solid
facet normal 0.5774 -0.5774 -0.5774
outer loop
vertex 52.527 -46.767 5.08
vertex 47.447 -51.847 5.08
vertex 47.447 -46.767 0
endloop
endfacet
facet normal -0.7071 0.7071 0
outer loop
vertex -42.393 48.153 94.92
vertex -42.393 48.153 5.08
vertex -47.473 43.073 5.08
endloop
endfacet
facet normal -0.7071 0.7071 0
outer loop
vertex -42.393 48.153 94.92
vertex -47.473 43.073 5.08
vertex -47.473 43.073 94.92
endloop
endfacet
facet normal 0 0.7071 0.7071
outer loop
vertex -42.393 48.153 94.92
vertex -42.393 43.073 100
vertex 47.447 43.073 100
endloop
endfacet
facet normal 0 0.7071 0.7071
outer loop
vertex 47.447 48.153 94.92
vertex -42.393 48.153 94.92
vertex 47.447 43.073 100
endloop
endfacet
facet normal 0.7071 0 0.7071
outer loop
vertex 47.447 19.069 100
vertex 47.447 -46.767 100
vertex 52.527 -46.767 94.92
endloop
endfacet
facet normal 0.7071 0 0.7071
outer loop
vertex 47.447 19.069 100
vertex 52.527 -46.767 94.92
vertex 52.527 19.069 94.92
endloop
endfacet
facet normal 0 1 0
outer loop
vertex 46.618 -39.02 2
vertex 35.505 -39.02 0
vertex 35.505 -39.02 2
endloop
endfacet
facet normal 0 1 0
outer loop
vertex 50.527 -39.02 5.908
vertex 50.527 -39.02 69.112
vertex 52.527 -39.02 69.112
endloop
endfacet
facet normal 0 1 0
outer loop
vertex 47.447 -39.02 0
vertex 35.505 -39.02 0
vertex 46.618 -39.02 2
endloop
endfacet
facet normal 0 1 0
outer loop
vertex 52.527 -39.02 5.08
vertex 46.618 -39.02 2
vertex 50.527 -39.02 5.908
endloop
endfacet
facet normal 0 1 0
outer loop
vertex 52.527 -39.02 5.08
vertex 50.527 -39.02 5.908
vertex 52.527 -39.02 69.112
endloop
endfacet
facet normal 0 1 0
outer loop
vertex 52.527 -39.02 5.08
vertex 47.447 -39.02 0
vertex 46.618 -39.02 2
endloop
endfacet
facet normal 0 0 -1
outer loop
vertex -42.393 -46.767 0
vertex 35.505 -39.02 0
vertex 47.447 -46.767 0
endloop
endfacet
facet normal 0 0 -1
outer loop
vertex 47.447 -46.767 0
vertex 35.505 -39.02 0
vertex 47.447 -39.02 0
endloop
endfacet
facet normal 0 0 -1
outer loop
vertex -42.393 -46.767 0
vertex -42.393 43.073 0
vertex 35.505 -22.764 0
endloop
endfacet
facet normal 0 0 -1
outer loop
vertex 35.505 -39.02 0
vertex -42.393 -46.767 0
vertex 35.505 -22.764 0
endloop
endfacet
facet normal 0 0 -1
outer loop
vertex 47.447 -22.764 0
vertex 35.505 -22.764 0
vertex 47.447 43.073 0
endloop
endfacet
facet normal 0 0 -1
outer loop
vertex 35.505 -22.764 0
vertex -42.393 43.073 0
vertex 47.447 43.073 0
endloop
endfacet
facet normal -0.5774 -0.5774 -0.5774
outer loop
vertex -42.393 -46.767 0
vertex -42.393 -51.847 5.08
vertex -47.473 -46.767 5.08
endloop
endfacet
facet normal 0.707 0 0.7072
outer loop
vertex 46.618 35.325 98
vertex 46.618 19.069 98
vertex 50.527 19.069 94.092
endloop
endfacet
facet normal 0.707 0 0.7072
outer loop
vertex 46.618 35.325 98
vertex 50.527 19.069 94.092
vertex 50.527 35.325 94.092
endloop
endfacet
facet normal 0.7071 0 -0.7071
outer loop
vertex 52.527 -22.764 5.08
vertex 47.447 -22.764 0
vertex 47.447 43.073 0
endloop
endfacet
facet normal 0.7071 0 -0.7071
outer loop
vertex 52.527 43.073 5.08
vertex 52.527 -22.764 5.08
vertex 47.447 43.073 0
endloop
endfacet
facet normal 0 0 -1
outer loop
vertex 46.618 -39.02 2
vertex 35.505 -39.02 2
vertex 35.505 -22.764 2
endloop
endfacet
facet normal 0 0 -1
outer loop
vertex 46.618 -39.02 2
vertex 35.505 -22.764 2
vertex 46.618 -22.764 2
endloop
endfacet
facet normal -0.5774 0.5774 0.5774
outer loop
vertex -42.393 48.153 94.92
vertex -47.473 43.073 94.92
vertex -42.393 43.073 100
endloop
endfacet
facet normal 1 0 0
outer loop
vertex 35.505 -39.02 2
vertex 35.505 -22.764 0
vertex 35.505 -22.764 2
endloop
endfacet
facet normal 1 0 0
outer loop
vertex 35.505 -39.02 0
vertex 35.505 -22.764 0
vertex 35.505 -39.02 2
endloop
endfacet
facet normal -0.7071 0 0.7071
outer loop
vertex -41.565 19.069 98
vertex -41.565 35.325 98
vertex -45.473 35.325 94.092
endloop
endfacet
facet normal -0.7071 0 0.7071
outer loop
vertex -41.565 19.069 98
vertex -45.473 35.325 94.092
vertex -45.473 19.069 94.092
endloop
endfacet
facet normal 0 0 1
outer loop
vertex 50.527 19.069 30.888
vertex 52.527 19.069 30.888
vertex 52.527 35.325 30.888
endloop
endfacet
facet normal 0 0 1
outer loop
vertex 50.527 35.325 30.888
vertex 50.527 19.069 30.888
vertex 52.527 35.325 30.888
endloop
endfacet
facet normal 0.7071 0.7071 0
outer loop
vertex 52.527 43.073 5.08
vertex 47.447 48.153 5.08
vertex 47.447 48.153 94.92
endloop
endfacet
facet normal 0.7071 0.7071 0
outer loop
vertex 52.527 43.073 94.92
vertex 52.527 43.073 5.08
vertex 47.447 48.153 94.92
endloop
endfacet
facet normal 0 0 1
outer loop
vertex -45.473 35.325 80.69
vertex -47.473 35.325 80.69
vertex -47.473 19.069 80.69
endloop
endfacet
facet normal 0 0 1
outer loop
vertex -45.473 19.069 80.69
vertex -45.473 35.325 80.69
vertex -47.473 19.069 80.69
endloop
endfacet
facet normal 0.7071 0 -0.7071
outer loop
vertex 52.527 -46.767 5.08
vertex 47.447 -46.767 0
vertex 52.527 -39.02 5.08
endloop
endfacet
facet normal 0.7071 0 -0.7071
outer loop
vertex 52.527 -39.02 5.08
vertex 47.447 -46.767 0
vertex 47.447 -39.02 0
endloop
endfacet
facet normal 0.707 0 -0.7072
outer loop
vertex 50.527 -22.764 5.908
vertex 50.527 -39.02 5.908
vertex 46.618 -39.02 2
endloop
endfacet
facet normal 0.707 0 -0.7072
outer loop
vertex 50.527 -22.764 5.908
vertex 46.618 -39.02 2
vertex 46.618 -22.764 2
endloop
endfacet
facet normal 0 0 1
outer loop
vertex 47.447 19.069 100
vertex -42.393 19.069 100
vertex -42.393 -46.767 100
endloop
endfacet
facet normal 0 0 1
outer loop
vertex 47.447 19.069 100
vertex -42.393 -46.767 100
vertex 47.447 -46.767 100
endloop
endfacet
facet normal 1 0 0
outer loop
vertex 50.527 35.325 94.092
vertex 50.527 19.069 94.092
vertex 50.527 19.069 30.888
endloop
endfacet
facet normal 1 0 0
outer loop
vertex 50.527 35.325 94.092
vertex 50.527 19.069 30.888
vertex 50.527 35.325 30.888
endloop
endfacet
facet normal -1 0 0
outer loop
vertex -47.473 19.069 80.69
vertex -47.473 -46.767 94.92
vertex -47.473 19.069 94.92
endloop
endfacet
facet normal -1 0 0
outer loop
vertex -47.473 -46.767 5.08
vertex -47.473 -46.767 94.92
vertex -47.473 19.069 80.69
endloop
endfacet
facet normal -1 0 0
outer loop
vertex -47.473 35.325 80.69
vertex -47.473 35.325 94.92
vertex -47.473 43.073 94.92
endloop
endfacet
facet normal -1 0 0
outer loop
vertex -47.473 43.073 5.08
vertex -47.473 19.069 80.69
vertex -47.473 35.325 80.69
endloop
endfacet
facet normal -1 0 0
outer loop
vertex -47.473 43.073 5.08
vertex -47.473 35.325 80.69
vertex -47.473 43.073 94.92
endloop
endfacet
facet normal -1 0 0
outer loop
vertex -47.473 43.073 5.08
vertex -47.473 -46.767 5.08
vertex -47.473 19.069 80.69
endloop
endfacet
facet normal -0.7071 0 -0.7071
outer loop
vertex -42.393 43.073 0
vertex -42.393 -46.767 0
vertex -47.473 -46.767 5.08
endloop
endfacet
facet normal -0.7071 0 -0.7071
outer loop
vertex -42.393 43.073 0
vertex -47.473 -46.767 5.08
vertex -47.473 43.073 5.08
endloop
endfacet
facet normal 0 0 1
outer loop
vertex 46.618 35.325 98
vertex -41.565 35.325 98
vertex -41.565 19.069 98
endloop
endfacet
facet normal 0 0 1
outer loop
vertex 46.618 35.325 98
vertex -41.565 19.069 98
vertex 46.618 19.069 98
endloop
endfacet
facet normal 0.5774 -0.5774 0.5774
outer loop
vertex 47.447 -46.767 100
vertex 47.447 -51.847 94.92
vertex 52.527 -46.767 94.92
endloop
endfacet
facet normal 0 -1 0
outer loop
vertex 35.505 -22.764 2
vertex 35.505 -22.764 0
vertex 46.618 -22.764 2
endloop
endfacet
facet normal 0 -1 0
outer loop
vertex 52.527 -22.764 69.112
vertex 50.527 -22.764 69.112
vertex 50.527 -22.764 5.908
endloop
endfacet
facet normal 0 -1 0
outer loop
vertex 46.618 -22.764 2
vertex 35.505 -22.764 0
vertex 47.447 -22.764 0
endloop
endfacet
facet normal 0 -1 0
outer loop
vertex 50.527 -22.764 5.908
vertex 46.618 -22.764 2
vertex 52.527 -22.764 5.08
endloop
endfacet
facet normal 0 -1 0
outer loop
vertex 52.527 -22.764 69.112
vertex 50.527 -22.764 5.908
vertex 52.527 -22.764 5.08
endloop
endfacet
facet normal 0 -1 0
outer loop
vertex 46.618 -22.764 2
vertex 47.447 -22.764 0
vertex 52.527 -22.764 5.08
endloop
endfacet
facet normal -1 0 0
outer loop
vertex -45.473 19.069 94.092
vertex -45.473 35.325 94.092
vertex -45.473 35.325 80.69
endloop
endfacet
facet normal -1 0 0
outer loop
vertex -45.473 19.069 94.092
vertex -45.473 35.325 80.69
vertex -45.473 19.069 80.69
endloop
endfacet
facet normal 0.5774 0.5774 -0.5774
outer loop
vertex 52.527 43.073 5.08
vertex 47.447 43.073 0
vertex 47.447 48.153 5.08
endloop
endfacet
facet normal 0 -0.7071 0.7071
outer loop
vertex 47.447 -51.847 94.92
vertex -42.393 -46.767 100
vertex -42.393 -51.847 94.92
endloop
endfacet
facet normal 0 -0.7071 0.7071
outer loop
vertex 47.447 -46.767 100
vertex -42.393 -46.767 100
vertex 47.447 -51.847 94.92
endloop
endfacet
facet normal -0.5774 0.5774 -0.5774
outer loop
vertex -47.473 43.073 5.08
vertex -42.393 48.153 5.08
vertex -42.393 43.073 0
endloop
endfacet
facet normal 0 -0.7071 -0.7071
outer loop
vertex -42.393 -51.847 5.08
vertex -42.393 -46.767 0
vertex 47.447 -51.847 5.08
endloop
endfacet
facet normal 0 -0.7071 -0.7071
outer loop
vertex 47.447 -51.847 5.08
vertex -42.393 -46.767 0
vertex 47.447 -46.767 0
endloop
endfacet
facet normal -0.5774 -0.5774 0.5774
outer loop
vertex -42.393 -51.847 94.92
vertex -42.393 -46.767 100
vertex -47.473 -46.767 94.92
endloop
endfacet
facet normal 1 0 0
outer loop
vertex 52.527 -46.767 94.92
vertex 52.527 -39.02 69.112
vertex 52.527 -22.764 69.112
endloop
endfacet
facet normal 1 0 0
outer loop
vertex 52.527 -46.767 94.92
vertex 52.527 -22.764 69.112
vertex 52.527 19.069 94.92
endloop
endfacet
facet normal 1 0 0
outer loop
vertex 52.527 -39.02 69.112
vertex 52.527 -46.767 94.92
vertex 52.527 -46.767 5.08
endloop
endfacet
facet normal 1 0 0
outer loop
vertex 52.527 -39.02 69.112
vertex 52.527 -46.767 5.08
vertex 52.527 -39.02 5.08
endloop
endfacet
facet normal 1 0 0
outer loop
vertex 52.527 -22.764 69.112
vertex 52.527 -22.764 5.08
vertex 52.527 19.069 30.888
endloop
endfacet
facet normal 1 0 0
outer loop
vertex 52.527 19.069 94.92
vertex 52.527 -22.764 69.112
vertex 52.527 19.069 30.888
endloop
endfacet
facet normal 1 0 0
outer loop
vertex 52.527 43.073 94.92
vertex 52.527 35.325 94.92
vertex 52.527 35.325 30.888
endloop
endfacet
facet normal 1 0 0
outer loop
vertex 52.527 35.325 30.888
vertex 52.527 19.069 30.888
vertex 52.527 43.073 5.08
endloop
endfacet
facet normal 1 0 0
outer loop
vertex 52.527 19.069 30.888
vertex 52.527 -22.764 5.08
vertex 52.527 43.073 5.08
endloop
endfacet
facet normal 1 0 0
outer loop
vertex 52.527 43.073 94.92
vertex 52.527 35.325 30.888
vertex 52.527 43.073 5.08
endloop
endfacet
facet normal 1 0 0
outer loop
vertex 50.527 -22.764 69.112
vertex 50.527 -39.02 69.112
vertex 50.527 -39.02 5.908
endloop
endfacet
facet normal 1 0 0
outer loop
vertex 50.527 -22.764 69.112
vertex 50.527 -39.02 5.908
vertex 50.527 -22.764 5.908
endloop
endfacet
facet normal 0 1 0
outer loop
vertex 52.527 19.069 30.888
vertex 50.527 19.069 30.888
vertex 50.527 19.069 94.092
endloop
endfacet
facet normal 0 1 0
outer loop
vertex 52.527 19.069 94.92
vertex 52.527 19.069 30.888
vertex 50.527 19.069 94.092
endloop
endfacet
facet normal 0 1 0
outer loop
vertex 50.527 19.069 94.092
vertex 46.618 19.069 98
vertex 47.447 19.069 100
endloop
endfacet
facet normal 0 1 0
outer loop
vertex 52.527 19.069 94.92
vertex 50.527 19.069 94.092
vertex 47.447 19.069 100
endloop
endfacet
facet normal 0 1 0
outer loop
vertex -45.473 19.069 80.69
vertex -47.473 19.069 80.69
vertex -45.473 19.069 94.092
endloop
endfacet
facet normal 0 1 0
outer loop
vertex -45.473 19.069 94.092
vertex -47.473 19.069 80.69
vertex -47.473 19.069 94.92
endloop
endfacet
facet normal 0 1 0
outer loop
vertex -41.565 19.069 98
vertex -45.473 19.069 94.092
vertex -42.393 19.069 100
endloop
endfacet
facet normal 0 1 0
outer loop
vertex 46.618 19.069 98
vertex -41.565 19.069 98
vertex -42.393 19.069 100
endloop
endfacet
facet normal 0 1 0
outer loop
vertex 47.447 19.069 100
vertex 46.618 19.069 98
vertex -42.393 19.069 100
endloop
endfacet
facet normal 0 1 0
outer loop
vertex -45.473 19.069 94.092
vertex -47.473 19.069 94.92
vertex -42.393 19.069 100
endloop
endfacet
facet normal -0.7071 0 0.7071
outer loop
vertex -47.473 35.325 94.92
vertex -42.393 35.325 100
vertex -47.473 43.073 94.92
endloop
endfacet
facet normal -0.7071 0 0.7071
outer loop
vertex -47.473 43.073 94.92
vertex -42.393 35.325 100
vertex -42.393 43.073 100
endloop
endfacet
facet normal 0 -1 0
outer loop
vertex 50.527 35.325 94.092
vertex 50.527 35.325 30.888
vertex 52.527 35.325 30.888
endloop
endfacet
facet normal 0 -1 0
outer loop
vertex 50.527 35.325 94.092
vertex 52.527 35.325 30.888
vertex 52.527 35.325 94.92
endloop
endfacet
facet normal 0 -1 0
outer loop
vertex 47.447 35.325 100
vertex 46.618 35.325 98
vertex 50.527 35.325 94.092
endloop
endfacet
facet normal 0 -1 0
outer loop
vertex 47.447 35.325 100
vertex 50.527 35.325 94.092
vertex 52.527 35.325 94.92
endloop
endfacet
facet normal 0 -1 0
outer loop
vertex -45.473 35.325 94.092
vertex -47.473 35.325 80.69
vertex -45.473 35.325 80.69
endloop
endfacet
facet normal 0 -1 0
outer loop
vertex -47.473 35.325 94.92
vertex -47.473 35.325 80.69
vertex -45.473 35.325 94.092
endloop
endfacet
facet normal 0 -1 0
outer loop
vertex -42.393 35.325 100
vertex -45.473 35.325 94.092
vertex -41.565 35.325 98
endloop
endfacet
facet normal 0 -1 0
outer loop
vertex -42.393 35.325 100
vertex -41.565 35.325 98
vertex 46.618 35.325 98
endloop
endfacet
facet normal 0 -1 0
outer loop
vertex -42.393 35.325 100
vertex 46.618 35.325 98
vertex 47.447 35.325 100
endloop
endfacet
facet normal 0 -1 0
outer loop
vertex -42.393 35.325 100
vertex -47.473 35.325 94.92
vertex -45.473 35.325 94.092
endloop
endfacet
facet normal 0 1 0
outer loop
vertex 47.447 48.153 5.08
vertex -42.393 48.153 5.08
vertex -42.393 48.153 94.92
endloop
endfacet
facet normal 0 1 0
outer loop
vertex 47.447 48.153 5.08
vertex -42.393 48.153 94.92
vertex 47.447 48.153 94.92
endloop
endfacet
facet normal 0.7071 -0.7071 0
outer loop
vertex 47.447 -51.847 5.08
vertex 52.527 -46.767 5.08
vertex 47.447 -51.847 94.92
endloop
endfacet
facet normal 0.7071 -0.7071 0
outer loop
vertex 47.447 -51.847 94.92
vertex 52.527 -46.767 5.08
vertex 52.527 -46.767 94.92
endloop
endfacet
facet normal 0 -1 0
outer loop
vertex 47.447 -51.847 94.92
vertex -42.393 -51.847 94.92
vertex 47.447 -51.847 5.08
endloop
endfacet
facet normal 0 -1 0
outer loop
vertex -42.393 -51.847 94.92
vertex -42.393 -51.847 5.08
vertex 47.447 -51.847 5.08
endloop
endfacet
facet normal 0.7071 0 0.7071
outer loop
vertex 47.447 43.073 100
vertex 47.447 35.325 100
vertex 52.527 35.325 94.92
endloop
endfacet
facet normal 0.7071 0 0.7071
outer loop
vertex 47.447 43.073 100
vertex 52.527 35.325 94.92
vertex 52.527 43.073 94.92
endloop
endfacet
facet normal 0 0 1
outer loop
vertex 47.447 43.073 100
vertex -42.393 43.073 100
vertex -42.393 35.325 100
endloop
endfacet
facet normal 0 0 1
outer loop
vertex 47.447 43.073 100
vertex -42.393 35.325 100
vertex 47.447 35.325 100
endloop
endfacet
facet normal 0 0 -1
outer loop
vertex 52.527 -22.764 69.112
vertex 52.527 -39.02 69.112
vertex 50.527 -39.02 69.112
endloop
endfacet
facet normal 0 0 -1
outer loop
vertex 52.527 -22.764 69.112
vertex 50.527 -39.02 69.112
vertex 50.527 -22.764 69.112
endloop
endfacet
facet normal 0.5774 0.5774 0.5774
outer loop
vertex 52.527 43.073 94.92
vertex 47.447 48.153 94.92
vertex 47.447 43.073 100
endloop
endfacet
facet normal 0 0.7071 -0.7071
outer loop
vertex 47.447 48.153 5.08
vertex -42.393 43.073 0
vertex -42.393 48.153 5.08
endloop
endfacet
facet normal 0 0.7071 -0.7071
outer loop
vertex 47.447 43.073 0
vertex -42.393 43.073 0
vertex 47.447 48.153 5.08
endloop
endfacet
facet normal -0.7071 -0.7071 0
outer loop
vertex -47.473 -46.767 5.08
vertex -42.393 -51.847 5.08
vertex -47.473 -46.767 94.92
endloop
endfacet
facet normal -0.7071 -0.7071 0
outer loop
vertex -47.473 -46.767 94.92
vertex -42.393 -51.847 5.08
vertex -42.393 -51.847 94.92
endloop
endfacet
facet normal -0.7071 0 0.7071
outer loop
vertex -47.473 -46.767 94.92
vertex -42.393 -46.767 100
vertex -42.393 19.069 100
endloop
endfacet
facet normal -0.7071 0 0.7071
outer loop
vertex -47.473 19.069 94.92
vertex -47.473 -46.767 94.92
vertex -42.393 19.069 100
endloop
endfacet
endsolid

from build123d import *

# Parameters (mm, degrees)
F0_W      = 100
F0_H      = 100
F1_DEPTH  = 100
F2_SIZE   = 5.08
F3_W      = 89.84
F3_H      = 16.256
F4_DEPTH  = 2
F5_W      = 16.256
F5_H      = 7.1842048969
F6_DEPTH  = 2
F7_W      = 16.256
F7_H      = 14.2303462458
F8_DEPTH  = 2
F9_W      = 16.256
F9_H      = 7.1842048969
F10_DEPTH = 2
F11_W     = 16.256
F11_H     = 64.0321317446
F12_DEPTH = 2
F13_W     = 16.256
F13_H     = 64.03213
F14_DEPTH = 2
F15_W     = 16.256
F15_H     = 7.1842048969
F16_DEPTH = 2
F17_W     = 11.9421218839
F17_H     = 16.256
F18_DEPTH = 2


with BuildPart() as f1:
    # F0 (on Top) → F1 (new body)
    with BuildSketch(Plane.XY):
        with Locations((2.5266306475, -1.8473280194)):
            Rectangle(F0_W, F0_H)
    extrude(amount=F1_DEPTH)

    # F2
    f2_edges = [f1.edges().sort_by_distance(p)[0] for p in [
        (2.526631, -51.847328, 100),
        (-47.473369, -1.847328, 100),
        (-47.473369, -51.847328, 50),
        (52.526631, -51.847328, 50),
        (2.526631, -51.847328, 0),
        (52.526631, -1.847328, 0),
        (2.526631, 48.152672, 0),
        (52.526631, 48.152672, 50),
        (-47.473369, 48.152672, 50),
        (-47.473369, -1.847328, 0),
        (2.526631, 48.152672, 100),
        (52.526631, -1.847328, 100),
    ]]
    chamfer(f2_edges, length=F2_SIZE)

    # F3 (on face) → F4 (cut)
    with BuildSketch(Plane.XY.offset(100)):
        with Locations((2.5266306475, 27.1967347203)):
            Rectangle(F3_W, F3_H)
    extrude(amount=-F4_DEPTH, mode=Mode.SUBTRACT)

    # F5 (on face) → F6 (cut)
    with BuildSketch(Plane(origin=(-71.1966846763, 0, 71.1966846763), x_dir=(0, -1, 0), z_dir=(-0.7071067812, 0, 0.7071067812))):
        with Locations((-27.1967347203, 37.1419367237)):
            Rectangle(F5_W, F5_H)
    extrude(amount=-F6_DEPTH, mode=Mode.SUBTRACT)

    # F7 (on face) → F8 (cut)
    with BuildSketch(Plane(origin=(-47.4733693525, 0, 0), x_dir=(0, -1, 0), z_dir=(-1, 0, 0))):
        with Locations((-27.1967347203, 87.8048268771)):
            Rectangle(F7_W, F7_H)
    extrude(amount=-F8_DEPTH, mode=Mode.SUBTRACT)

    # F9 (on face) → F10 (cut)
    with BuildSketch(Plane(origin=(73.7233153237, 0, 73.7233153237), x_dir=(0, 1, 0), z_dir=(0.7071067812, 0, 0.7071067812))):
        with Locations((27.1967347203, 33.5687413949)):
            Rectangle(F9_W, F9_H)
    extrude(amount=-F10_DEPTH, mode=Mode.SUBTRACT)

    # F11 (on face) → F12 (cut)
    with BuildSketch(Plane.YZ.offset(52.5266306475)):
        with Locations((27.1967347203, 62.9039341277)):
            Rectangle(F11_W, F11_H)
    extrude(amount=-F12_DEPTH, mode=Mode.SUBTRACT)

    # F13 (on face) → F14 (cut)
    with BuildSketch(Plane.YZ.offset(52.5266306475)):
        with Locations((-30.8923280194, 37.096065)):
            Rectangle(F13_W, F13_H)
    extrude(amount=-F14_DEPTH, mode=Mode.SUBTRACT)

    # F15 (on face) → F16 (cut)
    with BuildSketch(Plane(origin=(23.7233153237, 0, -23.7233153237), x_dir=(0, 1, 0), z_dir=(0.7071067812, 0, -0.7071067812))):
        with Locations((-30.8923280194, 37.1419367237)):
            Rectangle(F15_W, F15_H)
    extrude(amount=-F16_DEPTH, mode=Mode.SUBTRACT)

    # F17 (on face) → F18 (cut)
    with BuildSketch(Plane(origin=(0, 0, 0), x_dir=(1, 0, 0), z_dir=(0, 0, -1))):
        with Locations((41.4755697055, 30.8923280194)):
            Rectangle(F17_W, F17_H)
    extrude(amount=-F18_DEPTH, mode=Mode.SUBTRACT)


solid = f1.part
